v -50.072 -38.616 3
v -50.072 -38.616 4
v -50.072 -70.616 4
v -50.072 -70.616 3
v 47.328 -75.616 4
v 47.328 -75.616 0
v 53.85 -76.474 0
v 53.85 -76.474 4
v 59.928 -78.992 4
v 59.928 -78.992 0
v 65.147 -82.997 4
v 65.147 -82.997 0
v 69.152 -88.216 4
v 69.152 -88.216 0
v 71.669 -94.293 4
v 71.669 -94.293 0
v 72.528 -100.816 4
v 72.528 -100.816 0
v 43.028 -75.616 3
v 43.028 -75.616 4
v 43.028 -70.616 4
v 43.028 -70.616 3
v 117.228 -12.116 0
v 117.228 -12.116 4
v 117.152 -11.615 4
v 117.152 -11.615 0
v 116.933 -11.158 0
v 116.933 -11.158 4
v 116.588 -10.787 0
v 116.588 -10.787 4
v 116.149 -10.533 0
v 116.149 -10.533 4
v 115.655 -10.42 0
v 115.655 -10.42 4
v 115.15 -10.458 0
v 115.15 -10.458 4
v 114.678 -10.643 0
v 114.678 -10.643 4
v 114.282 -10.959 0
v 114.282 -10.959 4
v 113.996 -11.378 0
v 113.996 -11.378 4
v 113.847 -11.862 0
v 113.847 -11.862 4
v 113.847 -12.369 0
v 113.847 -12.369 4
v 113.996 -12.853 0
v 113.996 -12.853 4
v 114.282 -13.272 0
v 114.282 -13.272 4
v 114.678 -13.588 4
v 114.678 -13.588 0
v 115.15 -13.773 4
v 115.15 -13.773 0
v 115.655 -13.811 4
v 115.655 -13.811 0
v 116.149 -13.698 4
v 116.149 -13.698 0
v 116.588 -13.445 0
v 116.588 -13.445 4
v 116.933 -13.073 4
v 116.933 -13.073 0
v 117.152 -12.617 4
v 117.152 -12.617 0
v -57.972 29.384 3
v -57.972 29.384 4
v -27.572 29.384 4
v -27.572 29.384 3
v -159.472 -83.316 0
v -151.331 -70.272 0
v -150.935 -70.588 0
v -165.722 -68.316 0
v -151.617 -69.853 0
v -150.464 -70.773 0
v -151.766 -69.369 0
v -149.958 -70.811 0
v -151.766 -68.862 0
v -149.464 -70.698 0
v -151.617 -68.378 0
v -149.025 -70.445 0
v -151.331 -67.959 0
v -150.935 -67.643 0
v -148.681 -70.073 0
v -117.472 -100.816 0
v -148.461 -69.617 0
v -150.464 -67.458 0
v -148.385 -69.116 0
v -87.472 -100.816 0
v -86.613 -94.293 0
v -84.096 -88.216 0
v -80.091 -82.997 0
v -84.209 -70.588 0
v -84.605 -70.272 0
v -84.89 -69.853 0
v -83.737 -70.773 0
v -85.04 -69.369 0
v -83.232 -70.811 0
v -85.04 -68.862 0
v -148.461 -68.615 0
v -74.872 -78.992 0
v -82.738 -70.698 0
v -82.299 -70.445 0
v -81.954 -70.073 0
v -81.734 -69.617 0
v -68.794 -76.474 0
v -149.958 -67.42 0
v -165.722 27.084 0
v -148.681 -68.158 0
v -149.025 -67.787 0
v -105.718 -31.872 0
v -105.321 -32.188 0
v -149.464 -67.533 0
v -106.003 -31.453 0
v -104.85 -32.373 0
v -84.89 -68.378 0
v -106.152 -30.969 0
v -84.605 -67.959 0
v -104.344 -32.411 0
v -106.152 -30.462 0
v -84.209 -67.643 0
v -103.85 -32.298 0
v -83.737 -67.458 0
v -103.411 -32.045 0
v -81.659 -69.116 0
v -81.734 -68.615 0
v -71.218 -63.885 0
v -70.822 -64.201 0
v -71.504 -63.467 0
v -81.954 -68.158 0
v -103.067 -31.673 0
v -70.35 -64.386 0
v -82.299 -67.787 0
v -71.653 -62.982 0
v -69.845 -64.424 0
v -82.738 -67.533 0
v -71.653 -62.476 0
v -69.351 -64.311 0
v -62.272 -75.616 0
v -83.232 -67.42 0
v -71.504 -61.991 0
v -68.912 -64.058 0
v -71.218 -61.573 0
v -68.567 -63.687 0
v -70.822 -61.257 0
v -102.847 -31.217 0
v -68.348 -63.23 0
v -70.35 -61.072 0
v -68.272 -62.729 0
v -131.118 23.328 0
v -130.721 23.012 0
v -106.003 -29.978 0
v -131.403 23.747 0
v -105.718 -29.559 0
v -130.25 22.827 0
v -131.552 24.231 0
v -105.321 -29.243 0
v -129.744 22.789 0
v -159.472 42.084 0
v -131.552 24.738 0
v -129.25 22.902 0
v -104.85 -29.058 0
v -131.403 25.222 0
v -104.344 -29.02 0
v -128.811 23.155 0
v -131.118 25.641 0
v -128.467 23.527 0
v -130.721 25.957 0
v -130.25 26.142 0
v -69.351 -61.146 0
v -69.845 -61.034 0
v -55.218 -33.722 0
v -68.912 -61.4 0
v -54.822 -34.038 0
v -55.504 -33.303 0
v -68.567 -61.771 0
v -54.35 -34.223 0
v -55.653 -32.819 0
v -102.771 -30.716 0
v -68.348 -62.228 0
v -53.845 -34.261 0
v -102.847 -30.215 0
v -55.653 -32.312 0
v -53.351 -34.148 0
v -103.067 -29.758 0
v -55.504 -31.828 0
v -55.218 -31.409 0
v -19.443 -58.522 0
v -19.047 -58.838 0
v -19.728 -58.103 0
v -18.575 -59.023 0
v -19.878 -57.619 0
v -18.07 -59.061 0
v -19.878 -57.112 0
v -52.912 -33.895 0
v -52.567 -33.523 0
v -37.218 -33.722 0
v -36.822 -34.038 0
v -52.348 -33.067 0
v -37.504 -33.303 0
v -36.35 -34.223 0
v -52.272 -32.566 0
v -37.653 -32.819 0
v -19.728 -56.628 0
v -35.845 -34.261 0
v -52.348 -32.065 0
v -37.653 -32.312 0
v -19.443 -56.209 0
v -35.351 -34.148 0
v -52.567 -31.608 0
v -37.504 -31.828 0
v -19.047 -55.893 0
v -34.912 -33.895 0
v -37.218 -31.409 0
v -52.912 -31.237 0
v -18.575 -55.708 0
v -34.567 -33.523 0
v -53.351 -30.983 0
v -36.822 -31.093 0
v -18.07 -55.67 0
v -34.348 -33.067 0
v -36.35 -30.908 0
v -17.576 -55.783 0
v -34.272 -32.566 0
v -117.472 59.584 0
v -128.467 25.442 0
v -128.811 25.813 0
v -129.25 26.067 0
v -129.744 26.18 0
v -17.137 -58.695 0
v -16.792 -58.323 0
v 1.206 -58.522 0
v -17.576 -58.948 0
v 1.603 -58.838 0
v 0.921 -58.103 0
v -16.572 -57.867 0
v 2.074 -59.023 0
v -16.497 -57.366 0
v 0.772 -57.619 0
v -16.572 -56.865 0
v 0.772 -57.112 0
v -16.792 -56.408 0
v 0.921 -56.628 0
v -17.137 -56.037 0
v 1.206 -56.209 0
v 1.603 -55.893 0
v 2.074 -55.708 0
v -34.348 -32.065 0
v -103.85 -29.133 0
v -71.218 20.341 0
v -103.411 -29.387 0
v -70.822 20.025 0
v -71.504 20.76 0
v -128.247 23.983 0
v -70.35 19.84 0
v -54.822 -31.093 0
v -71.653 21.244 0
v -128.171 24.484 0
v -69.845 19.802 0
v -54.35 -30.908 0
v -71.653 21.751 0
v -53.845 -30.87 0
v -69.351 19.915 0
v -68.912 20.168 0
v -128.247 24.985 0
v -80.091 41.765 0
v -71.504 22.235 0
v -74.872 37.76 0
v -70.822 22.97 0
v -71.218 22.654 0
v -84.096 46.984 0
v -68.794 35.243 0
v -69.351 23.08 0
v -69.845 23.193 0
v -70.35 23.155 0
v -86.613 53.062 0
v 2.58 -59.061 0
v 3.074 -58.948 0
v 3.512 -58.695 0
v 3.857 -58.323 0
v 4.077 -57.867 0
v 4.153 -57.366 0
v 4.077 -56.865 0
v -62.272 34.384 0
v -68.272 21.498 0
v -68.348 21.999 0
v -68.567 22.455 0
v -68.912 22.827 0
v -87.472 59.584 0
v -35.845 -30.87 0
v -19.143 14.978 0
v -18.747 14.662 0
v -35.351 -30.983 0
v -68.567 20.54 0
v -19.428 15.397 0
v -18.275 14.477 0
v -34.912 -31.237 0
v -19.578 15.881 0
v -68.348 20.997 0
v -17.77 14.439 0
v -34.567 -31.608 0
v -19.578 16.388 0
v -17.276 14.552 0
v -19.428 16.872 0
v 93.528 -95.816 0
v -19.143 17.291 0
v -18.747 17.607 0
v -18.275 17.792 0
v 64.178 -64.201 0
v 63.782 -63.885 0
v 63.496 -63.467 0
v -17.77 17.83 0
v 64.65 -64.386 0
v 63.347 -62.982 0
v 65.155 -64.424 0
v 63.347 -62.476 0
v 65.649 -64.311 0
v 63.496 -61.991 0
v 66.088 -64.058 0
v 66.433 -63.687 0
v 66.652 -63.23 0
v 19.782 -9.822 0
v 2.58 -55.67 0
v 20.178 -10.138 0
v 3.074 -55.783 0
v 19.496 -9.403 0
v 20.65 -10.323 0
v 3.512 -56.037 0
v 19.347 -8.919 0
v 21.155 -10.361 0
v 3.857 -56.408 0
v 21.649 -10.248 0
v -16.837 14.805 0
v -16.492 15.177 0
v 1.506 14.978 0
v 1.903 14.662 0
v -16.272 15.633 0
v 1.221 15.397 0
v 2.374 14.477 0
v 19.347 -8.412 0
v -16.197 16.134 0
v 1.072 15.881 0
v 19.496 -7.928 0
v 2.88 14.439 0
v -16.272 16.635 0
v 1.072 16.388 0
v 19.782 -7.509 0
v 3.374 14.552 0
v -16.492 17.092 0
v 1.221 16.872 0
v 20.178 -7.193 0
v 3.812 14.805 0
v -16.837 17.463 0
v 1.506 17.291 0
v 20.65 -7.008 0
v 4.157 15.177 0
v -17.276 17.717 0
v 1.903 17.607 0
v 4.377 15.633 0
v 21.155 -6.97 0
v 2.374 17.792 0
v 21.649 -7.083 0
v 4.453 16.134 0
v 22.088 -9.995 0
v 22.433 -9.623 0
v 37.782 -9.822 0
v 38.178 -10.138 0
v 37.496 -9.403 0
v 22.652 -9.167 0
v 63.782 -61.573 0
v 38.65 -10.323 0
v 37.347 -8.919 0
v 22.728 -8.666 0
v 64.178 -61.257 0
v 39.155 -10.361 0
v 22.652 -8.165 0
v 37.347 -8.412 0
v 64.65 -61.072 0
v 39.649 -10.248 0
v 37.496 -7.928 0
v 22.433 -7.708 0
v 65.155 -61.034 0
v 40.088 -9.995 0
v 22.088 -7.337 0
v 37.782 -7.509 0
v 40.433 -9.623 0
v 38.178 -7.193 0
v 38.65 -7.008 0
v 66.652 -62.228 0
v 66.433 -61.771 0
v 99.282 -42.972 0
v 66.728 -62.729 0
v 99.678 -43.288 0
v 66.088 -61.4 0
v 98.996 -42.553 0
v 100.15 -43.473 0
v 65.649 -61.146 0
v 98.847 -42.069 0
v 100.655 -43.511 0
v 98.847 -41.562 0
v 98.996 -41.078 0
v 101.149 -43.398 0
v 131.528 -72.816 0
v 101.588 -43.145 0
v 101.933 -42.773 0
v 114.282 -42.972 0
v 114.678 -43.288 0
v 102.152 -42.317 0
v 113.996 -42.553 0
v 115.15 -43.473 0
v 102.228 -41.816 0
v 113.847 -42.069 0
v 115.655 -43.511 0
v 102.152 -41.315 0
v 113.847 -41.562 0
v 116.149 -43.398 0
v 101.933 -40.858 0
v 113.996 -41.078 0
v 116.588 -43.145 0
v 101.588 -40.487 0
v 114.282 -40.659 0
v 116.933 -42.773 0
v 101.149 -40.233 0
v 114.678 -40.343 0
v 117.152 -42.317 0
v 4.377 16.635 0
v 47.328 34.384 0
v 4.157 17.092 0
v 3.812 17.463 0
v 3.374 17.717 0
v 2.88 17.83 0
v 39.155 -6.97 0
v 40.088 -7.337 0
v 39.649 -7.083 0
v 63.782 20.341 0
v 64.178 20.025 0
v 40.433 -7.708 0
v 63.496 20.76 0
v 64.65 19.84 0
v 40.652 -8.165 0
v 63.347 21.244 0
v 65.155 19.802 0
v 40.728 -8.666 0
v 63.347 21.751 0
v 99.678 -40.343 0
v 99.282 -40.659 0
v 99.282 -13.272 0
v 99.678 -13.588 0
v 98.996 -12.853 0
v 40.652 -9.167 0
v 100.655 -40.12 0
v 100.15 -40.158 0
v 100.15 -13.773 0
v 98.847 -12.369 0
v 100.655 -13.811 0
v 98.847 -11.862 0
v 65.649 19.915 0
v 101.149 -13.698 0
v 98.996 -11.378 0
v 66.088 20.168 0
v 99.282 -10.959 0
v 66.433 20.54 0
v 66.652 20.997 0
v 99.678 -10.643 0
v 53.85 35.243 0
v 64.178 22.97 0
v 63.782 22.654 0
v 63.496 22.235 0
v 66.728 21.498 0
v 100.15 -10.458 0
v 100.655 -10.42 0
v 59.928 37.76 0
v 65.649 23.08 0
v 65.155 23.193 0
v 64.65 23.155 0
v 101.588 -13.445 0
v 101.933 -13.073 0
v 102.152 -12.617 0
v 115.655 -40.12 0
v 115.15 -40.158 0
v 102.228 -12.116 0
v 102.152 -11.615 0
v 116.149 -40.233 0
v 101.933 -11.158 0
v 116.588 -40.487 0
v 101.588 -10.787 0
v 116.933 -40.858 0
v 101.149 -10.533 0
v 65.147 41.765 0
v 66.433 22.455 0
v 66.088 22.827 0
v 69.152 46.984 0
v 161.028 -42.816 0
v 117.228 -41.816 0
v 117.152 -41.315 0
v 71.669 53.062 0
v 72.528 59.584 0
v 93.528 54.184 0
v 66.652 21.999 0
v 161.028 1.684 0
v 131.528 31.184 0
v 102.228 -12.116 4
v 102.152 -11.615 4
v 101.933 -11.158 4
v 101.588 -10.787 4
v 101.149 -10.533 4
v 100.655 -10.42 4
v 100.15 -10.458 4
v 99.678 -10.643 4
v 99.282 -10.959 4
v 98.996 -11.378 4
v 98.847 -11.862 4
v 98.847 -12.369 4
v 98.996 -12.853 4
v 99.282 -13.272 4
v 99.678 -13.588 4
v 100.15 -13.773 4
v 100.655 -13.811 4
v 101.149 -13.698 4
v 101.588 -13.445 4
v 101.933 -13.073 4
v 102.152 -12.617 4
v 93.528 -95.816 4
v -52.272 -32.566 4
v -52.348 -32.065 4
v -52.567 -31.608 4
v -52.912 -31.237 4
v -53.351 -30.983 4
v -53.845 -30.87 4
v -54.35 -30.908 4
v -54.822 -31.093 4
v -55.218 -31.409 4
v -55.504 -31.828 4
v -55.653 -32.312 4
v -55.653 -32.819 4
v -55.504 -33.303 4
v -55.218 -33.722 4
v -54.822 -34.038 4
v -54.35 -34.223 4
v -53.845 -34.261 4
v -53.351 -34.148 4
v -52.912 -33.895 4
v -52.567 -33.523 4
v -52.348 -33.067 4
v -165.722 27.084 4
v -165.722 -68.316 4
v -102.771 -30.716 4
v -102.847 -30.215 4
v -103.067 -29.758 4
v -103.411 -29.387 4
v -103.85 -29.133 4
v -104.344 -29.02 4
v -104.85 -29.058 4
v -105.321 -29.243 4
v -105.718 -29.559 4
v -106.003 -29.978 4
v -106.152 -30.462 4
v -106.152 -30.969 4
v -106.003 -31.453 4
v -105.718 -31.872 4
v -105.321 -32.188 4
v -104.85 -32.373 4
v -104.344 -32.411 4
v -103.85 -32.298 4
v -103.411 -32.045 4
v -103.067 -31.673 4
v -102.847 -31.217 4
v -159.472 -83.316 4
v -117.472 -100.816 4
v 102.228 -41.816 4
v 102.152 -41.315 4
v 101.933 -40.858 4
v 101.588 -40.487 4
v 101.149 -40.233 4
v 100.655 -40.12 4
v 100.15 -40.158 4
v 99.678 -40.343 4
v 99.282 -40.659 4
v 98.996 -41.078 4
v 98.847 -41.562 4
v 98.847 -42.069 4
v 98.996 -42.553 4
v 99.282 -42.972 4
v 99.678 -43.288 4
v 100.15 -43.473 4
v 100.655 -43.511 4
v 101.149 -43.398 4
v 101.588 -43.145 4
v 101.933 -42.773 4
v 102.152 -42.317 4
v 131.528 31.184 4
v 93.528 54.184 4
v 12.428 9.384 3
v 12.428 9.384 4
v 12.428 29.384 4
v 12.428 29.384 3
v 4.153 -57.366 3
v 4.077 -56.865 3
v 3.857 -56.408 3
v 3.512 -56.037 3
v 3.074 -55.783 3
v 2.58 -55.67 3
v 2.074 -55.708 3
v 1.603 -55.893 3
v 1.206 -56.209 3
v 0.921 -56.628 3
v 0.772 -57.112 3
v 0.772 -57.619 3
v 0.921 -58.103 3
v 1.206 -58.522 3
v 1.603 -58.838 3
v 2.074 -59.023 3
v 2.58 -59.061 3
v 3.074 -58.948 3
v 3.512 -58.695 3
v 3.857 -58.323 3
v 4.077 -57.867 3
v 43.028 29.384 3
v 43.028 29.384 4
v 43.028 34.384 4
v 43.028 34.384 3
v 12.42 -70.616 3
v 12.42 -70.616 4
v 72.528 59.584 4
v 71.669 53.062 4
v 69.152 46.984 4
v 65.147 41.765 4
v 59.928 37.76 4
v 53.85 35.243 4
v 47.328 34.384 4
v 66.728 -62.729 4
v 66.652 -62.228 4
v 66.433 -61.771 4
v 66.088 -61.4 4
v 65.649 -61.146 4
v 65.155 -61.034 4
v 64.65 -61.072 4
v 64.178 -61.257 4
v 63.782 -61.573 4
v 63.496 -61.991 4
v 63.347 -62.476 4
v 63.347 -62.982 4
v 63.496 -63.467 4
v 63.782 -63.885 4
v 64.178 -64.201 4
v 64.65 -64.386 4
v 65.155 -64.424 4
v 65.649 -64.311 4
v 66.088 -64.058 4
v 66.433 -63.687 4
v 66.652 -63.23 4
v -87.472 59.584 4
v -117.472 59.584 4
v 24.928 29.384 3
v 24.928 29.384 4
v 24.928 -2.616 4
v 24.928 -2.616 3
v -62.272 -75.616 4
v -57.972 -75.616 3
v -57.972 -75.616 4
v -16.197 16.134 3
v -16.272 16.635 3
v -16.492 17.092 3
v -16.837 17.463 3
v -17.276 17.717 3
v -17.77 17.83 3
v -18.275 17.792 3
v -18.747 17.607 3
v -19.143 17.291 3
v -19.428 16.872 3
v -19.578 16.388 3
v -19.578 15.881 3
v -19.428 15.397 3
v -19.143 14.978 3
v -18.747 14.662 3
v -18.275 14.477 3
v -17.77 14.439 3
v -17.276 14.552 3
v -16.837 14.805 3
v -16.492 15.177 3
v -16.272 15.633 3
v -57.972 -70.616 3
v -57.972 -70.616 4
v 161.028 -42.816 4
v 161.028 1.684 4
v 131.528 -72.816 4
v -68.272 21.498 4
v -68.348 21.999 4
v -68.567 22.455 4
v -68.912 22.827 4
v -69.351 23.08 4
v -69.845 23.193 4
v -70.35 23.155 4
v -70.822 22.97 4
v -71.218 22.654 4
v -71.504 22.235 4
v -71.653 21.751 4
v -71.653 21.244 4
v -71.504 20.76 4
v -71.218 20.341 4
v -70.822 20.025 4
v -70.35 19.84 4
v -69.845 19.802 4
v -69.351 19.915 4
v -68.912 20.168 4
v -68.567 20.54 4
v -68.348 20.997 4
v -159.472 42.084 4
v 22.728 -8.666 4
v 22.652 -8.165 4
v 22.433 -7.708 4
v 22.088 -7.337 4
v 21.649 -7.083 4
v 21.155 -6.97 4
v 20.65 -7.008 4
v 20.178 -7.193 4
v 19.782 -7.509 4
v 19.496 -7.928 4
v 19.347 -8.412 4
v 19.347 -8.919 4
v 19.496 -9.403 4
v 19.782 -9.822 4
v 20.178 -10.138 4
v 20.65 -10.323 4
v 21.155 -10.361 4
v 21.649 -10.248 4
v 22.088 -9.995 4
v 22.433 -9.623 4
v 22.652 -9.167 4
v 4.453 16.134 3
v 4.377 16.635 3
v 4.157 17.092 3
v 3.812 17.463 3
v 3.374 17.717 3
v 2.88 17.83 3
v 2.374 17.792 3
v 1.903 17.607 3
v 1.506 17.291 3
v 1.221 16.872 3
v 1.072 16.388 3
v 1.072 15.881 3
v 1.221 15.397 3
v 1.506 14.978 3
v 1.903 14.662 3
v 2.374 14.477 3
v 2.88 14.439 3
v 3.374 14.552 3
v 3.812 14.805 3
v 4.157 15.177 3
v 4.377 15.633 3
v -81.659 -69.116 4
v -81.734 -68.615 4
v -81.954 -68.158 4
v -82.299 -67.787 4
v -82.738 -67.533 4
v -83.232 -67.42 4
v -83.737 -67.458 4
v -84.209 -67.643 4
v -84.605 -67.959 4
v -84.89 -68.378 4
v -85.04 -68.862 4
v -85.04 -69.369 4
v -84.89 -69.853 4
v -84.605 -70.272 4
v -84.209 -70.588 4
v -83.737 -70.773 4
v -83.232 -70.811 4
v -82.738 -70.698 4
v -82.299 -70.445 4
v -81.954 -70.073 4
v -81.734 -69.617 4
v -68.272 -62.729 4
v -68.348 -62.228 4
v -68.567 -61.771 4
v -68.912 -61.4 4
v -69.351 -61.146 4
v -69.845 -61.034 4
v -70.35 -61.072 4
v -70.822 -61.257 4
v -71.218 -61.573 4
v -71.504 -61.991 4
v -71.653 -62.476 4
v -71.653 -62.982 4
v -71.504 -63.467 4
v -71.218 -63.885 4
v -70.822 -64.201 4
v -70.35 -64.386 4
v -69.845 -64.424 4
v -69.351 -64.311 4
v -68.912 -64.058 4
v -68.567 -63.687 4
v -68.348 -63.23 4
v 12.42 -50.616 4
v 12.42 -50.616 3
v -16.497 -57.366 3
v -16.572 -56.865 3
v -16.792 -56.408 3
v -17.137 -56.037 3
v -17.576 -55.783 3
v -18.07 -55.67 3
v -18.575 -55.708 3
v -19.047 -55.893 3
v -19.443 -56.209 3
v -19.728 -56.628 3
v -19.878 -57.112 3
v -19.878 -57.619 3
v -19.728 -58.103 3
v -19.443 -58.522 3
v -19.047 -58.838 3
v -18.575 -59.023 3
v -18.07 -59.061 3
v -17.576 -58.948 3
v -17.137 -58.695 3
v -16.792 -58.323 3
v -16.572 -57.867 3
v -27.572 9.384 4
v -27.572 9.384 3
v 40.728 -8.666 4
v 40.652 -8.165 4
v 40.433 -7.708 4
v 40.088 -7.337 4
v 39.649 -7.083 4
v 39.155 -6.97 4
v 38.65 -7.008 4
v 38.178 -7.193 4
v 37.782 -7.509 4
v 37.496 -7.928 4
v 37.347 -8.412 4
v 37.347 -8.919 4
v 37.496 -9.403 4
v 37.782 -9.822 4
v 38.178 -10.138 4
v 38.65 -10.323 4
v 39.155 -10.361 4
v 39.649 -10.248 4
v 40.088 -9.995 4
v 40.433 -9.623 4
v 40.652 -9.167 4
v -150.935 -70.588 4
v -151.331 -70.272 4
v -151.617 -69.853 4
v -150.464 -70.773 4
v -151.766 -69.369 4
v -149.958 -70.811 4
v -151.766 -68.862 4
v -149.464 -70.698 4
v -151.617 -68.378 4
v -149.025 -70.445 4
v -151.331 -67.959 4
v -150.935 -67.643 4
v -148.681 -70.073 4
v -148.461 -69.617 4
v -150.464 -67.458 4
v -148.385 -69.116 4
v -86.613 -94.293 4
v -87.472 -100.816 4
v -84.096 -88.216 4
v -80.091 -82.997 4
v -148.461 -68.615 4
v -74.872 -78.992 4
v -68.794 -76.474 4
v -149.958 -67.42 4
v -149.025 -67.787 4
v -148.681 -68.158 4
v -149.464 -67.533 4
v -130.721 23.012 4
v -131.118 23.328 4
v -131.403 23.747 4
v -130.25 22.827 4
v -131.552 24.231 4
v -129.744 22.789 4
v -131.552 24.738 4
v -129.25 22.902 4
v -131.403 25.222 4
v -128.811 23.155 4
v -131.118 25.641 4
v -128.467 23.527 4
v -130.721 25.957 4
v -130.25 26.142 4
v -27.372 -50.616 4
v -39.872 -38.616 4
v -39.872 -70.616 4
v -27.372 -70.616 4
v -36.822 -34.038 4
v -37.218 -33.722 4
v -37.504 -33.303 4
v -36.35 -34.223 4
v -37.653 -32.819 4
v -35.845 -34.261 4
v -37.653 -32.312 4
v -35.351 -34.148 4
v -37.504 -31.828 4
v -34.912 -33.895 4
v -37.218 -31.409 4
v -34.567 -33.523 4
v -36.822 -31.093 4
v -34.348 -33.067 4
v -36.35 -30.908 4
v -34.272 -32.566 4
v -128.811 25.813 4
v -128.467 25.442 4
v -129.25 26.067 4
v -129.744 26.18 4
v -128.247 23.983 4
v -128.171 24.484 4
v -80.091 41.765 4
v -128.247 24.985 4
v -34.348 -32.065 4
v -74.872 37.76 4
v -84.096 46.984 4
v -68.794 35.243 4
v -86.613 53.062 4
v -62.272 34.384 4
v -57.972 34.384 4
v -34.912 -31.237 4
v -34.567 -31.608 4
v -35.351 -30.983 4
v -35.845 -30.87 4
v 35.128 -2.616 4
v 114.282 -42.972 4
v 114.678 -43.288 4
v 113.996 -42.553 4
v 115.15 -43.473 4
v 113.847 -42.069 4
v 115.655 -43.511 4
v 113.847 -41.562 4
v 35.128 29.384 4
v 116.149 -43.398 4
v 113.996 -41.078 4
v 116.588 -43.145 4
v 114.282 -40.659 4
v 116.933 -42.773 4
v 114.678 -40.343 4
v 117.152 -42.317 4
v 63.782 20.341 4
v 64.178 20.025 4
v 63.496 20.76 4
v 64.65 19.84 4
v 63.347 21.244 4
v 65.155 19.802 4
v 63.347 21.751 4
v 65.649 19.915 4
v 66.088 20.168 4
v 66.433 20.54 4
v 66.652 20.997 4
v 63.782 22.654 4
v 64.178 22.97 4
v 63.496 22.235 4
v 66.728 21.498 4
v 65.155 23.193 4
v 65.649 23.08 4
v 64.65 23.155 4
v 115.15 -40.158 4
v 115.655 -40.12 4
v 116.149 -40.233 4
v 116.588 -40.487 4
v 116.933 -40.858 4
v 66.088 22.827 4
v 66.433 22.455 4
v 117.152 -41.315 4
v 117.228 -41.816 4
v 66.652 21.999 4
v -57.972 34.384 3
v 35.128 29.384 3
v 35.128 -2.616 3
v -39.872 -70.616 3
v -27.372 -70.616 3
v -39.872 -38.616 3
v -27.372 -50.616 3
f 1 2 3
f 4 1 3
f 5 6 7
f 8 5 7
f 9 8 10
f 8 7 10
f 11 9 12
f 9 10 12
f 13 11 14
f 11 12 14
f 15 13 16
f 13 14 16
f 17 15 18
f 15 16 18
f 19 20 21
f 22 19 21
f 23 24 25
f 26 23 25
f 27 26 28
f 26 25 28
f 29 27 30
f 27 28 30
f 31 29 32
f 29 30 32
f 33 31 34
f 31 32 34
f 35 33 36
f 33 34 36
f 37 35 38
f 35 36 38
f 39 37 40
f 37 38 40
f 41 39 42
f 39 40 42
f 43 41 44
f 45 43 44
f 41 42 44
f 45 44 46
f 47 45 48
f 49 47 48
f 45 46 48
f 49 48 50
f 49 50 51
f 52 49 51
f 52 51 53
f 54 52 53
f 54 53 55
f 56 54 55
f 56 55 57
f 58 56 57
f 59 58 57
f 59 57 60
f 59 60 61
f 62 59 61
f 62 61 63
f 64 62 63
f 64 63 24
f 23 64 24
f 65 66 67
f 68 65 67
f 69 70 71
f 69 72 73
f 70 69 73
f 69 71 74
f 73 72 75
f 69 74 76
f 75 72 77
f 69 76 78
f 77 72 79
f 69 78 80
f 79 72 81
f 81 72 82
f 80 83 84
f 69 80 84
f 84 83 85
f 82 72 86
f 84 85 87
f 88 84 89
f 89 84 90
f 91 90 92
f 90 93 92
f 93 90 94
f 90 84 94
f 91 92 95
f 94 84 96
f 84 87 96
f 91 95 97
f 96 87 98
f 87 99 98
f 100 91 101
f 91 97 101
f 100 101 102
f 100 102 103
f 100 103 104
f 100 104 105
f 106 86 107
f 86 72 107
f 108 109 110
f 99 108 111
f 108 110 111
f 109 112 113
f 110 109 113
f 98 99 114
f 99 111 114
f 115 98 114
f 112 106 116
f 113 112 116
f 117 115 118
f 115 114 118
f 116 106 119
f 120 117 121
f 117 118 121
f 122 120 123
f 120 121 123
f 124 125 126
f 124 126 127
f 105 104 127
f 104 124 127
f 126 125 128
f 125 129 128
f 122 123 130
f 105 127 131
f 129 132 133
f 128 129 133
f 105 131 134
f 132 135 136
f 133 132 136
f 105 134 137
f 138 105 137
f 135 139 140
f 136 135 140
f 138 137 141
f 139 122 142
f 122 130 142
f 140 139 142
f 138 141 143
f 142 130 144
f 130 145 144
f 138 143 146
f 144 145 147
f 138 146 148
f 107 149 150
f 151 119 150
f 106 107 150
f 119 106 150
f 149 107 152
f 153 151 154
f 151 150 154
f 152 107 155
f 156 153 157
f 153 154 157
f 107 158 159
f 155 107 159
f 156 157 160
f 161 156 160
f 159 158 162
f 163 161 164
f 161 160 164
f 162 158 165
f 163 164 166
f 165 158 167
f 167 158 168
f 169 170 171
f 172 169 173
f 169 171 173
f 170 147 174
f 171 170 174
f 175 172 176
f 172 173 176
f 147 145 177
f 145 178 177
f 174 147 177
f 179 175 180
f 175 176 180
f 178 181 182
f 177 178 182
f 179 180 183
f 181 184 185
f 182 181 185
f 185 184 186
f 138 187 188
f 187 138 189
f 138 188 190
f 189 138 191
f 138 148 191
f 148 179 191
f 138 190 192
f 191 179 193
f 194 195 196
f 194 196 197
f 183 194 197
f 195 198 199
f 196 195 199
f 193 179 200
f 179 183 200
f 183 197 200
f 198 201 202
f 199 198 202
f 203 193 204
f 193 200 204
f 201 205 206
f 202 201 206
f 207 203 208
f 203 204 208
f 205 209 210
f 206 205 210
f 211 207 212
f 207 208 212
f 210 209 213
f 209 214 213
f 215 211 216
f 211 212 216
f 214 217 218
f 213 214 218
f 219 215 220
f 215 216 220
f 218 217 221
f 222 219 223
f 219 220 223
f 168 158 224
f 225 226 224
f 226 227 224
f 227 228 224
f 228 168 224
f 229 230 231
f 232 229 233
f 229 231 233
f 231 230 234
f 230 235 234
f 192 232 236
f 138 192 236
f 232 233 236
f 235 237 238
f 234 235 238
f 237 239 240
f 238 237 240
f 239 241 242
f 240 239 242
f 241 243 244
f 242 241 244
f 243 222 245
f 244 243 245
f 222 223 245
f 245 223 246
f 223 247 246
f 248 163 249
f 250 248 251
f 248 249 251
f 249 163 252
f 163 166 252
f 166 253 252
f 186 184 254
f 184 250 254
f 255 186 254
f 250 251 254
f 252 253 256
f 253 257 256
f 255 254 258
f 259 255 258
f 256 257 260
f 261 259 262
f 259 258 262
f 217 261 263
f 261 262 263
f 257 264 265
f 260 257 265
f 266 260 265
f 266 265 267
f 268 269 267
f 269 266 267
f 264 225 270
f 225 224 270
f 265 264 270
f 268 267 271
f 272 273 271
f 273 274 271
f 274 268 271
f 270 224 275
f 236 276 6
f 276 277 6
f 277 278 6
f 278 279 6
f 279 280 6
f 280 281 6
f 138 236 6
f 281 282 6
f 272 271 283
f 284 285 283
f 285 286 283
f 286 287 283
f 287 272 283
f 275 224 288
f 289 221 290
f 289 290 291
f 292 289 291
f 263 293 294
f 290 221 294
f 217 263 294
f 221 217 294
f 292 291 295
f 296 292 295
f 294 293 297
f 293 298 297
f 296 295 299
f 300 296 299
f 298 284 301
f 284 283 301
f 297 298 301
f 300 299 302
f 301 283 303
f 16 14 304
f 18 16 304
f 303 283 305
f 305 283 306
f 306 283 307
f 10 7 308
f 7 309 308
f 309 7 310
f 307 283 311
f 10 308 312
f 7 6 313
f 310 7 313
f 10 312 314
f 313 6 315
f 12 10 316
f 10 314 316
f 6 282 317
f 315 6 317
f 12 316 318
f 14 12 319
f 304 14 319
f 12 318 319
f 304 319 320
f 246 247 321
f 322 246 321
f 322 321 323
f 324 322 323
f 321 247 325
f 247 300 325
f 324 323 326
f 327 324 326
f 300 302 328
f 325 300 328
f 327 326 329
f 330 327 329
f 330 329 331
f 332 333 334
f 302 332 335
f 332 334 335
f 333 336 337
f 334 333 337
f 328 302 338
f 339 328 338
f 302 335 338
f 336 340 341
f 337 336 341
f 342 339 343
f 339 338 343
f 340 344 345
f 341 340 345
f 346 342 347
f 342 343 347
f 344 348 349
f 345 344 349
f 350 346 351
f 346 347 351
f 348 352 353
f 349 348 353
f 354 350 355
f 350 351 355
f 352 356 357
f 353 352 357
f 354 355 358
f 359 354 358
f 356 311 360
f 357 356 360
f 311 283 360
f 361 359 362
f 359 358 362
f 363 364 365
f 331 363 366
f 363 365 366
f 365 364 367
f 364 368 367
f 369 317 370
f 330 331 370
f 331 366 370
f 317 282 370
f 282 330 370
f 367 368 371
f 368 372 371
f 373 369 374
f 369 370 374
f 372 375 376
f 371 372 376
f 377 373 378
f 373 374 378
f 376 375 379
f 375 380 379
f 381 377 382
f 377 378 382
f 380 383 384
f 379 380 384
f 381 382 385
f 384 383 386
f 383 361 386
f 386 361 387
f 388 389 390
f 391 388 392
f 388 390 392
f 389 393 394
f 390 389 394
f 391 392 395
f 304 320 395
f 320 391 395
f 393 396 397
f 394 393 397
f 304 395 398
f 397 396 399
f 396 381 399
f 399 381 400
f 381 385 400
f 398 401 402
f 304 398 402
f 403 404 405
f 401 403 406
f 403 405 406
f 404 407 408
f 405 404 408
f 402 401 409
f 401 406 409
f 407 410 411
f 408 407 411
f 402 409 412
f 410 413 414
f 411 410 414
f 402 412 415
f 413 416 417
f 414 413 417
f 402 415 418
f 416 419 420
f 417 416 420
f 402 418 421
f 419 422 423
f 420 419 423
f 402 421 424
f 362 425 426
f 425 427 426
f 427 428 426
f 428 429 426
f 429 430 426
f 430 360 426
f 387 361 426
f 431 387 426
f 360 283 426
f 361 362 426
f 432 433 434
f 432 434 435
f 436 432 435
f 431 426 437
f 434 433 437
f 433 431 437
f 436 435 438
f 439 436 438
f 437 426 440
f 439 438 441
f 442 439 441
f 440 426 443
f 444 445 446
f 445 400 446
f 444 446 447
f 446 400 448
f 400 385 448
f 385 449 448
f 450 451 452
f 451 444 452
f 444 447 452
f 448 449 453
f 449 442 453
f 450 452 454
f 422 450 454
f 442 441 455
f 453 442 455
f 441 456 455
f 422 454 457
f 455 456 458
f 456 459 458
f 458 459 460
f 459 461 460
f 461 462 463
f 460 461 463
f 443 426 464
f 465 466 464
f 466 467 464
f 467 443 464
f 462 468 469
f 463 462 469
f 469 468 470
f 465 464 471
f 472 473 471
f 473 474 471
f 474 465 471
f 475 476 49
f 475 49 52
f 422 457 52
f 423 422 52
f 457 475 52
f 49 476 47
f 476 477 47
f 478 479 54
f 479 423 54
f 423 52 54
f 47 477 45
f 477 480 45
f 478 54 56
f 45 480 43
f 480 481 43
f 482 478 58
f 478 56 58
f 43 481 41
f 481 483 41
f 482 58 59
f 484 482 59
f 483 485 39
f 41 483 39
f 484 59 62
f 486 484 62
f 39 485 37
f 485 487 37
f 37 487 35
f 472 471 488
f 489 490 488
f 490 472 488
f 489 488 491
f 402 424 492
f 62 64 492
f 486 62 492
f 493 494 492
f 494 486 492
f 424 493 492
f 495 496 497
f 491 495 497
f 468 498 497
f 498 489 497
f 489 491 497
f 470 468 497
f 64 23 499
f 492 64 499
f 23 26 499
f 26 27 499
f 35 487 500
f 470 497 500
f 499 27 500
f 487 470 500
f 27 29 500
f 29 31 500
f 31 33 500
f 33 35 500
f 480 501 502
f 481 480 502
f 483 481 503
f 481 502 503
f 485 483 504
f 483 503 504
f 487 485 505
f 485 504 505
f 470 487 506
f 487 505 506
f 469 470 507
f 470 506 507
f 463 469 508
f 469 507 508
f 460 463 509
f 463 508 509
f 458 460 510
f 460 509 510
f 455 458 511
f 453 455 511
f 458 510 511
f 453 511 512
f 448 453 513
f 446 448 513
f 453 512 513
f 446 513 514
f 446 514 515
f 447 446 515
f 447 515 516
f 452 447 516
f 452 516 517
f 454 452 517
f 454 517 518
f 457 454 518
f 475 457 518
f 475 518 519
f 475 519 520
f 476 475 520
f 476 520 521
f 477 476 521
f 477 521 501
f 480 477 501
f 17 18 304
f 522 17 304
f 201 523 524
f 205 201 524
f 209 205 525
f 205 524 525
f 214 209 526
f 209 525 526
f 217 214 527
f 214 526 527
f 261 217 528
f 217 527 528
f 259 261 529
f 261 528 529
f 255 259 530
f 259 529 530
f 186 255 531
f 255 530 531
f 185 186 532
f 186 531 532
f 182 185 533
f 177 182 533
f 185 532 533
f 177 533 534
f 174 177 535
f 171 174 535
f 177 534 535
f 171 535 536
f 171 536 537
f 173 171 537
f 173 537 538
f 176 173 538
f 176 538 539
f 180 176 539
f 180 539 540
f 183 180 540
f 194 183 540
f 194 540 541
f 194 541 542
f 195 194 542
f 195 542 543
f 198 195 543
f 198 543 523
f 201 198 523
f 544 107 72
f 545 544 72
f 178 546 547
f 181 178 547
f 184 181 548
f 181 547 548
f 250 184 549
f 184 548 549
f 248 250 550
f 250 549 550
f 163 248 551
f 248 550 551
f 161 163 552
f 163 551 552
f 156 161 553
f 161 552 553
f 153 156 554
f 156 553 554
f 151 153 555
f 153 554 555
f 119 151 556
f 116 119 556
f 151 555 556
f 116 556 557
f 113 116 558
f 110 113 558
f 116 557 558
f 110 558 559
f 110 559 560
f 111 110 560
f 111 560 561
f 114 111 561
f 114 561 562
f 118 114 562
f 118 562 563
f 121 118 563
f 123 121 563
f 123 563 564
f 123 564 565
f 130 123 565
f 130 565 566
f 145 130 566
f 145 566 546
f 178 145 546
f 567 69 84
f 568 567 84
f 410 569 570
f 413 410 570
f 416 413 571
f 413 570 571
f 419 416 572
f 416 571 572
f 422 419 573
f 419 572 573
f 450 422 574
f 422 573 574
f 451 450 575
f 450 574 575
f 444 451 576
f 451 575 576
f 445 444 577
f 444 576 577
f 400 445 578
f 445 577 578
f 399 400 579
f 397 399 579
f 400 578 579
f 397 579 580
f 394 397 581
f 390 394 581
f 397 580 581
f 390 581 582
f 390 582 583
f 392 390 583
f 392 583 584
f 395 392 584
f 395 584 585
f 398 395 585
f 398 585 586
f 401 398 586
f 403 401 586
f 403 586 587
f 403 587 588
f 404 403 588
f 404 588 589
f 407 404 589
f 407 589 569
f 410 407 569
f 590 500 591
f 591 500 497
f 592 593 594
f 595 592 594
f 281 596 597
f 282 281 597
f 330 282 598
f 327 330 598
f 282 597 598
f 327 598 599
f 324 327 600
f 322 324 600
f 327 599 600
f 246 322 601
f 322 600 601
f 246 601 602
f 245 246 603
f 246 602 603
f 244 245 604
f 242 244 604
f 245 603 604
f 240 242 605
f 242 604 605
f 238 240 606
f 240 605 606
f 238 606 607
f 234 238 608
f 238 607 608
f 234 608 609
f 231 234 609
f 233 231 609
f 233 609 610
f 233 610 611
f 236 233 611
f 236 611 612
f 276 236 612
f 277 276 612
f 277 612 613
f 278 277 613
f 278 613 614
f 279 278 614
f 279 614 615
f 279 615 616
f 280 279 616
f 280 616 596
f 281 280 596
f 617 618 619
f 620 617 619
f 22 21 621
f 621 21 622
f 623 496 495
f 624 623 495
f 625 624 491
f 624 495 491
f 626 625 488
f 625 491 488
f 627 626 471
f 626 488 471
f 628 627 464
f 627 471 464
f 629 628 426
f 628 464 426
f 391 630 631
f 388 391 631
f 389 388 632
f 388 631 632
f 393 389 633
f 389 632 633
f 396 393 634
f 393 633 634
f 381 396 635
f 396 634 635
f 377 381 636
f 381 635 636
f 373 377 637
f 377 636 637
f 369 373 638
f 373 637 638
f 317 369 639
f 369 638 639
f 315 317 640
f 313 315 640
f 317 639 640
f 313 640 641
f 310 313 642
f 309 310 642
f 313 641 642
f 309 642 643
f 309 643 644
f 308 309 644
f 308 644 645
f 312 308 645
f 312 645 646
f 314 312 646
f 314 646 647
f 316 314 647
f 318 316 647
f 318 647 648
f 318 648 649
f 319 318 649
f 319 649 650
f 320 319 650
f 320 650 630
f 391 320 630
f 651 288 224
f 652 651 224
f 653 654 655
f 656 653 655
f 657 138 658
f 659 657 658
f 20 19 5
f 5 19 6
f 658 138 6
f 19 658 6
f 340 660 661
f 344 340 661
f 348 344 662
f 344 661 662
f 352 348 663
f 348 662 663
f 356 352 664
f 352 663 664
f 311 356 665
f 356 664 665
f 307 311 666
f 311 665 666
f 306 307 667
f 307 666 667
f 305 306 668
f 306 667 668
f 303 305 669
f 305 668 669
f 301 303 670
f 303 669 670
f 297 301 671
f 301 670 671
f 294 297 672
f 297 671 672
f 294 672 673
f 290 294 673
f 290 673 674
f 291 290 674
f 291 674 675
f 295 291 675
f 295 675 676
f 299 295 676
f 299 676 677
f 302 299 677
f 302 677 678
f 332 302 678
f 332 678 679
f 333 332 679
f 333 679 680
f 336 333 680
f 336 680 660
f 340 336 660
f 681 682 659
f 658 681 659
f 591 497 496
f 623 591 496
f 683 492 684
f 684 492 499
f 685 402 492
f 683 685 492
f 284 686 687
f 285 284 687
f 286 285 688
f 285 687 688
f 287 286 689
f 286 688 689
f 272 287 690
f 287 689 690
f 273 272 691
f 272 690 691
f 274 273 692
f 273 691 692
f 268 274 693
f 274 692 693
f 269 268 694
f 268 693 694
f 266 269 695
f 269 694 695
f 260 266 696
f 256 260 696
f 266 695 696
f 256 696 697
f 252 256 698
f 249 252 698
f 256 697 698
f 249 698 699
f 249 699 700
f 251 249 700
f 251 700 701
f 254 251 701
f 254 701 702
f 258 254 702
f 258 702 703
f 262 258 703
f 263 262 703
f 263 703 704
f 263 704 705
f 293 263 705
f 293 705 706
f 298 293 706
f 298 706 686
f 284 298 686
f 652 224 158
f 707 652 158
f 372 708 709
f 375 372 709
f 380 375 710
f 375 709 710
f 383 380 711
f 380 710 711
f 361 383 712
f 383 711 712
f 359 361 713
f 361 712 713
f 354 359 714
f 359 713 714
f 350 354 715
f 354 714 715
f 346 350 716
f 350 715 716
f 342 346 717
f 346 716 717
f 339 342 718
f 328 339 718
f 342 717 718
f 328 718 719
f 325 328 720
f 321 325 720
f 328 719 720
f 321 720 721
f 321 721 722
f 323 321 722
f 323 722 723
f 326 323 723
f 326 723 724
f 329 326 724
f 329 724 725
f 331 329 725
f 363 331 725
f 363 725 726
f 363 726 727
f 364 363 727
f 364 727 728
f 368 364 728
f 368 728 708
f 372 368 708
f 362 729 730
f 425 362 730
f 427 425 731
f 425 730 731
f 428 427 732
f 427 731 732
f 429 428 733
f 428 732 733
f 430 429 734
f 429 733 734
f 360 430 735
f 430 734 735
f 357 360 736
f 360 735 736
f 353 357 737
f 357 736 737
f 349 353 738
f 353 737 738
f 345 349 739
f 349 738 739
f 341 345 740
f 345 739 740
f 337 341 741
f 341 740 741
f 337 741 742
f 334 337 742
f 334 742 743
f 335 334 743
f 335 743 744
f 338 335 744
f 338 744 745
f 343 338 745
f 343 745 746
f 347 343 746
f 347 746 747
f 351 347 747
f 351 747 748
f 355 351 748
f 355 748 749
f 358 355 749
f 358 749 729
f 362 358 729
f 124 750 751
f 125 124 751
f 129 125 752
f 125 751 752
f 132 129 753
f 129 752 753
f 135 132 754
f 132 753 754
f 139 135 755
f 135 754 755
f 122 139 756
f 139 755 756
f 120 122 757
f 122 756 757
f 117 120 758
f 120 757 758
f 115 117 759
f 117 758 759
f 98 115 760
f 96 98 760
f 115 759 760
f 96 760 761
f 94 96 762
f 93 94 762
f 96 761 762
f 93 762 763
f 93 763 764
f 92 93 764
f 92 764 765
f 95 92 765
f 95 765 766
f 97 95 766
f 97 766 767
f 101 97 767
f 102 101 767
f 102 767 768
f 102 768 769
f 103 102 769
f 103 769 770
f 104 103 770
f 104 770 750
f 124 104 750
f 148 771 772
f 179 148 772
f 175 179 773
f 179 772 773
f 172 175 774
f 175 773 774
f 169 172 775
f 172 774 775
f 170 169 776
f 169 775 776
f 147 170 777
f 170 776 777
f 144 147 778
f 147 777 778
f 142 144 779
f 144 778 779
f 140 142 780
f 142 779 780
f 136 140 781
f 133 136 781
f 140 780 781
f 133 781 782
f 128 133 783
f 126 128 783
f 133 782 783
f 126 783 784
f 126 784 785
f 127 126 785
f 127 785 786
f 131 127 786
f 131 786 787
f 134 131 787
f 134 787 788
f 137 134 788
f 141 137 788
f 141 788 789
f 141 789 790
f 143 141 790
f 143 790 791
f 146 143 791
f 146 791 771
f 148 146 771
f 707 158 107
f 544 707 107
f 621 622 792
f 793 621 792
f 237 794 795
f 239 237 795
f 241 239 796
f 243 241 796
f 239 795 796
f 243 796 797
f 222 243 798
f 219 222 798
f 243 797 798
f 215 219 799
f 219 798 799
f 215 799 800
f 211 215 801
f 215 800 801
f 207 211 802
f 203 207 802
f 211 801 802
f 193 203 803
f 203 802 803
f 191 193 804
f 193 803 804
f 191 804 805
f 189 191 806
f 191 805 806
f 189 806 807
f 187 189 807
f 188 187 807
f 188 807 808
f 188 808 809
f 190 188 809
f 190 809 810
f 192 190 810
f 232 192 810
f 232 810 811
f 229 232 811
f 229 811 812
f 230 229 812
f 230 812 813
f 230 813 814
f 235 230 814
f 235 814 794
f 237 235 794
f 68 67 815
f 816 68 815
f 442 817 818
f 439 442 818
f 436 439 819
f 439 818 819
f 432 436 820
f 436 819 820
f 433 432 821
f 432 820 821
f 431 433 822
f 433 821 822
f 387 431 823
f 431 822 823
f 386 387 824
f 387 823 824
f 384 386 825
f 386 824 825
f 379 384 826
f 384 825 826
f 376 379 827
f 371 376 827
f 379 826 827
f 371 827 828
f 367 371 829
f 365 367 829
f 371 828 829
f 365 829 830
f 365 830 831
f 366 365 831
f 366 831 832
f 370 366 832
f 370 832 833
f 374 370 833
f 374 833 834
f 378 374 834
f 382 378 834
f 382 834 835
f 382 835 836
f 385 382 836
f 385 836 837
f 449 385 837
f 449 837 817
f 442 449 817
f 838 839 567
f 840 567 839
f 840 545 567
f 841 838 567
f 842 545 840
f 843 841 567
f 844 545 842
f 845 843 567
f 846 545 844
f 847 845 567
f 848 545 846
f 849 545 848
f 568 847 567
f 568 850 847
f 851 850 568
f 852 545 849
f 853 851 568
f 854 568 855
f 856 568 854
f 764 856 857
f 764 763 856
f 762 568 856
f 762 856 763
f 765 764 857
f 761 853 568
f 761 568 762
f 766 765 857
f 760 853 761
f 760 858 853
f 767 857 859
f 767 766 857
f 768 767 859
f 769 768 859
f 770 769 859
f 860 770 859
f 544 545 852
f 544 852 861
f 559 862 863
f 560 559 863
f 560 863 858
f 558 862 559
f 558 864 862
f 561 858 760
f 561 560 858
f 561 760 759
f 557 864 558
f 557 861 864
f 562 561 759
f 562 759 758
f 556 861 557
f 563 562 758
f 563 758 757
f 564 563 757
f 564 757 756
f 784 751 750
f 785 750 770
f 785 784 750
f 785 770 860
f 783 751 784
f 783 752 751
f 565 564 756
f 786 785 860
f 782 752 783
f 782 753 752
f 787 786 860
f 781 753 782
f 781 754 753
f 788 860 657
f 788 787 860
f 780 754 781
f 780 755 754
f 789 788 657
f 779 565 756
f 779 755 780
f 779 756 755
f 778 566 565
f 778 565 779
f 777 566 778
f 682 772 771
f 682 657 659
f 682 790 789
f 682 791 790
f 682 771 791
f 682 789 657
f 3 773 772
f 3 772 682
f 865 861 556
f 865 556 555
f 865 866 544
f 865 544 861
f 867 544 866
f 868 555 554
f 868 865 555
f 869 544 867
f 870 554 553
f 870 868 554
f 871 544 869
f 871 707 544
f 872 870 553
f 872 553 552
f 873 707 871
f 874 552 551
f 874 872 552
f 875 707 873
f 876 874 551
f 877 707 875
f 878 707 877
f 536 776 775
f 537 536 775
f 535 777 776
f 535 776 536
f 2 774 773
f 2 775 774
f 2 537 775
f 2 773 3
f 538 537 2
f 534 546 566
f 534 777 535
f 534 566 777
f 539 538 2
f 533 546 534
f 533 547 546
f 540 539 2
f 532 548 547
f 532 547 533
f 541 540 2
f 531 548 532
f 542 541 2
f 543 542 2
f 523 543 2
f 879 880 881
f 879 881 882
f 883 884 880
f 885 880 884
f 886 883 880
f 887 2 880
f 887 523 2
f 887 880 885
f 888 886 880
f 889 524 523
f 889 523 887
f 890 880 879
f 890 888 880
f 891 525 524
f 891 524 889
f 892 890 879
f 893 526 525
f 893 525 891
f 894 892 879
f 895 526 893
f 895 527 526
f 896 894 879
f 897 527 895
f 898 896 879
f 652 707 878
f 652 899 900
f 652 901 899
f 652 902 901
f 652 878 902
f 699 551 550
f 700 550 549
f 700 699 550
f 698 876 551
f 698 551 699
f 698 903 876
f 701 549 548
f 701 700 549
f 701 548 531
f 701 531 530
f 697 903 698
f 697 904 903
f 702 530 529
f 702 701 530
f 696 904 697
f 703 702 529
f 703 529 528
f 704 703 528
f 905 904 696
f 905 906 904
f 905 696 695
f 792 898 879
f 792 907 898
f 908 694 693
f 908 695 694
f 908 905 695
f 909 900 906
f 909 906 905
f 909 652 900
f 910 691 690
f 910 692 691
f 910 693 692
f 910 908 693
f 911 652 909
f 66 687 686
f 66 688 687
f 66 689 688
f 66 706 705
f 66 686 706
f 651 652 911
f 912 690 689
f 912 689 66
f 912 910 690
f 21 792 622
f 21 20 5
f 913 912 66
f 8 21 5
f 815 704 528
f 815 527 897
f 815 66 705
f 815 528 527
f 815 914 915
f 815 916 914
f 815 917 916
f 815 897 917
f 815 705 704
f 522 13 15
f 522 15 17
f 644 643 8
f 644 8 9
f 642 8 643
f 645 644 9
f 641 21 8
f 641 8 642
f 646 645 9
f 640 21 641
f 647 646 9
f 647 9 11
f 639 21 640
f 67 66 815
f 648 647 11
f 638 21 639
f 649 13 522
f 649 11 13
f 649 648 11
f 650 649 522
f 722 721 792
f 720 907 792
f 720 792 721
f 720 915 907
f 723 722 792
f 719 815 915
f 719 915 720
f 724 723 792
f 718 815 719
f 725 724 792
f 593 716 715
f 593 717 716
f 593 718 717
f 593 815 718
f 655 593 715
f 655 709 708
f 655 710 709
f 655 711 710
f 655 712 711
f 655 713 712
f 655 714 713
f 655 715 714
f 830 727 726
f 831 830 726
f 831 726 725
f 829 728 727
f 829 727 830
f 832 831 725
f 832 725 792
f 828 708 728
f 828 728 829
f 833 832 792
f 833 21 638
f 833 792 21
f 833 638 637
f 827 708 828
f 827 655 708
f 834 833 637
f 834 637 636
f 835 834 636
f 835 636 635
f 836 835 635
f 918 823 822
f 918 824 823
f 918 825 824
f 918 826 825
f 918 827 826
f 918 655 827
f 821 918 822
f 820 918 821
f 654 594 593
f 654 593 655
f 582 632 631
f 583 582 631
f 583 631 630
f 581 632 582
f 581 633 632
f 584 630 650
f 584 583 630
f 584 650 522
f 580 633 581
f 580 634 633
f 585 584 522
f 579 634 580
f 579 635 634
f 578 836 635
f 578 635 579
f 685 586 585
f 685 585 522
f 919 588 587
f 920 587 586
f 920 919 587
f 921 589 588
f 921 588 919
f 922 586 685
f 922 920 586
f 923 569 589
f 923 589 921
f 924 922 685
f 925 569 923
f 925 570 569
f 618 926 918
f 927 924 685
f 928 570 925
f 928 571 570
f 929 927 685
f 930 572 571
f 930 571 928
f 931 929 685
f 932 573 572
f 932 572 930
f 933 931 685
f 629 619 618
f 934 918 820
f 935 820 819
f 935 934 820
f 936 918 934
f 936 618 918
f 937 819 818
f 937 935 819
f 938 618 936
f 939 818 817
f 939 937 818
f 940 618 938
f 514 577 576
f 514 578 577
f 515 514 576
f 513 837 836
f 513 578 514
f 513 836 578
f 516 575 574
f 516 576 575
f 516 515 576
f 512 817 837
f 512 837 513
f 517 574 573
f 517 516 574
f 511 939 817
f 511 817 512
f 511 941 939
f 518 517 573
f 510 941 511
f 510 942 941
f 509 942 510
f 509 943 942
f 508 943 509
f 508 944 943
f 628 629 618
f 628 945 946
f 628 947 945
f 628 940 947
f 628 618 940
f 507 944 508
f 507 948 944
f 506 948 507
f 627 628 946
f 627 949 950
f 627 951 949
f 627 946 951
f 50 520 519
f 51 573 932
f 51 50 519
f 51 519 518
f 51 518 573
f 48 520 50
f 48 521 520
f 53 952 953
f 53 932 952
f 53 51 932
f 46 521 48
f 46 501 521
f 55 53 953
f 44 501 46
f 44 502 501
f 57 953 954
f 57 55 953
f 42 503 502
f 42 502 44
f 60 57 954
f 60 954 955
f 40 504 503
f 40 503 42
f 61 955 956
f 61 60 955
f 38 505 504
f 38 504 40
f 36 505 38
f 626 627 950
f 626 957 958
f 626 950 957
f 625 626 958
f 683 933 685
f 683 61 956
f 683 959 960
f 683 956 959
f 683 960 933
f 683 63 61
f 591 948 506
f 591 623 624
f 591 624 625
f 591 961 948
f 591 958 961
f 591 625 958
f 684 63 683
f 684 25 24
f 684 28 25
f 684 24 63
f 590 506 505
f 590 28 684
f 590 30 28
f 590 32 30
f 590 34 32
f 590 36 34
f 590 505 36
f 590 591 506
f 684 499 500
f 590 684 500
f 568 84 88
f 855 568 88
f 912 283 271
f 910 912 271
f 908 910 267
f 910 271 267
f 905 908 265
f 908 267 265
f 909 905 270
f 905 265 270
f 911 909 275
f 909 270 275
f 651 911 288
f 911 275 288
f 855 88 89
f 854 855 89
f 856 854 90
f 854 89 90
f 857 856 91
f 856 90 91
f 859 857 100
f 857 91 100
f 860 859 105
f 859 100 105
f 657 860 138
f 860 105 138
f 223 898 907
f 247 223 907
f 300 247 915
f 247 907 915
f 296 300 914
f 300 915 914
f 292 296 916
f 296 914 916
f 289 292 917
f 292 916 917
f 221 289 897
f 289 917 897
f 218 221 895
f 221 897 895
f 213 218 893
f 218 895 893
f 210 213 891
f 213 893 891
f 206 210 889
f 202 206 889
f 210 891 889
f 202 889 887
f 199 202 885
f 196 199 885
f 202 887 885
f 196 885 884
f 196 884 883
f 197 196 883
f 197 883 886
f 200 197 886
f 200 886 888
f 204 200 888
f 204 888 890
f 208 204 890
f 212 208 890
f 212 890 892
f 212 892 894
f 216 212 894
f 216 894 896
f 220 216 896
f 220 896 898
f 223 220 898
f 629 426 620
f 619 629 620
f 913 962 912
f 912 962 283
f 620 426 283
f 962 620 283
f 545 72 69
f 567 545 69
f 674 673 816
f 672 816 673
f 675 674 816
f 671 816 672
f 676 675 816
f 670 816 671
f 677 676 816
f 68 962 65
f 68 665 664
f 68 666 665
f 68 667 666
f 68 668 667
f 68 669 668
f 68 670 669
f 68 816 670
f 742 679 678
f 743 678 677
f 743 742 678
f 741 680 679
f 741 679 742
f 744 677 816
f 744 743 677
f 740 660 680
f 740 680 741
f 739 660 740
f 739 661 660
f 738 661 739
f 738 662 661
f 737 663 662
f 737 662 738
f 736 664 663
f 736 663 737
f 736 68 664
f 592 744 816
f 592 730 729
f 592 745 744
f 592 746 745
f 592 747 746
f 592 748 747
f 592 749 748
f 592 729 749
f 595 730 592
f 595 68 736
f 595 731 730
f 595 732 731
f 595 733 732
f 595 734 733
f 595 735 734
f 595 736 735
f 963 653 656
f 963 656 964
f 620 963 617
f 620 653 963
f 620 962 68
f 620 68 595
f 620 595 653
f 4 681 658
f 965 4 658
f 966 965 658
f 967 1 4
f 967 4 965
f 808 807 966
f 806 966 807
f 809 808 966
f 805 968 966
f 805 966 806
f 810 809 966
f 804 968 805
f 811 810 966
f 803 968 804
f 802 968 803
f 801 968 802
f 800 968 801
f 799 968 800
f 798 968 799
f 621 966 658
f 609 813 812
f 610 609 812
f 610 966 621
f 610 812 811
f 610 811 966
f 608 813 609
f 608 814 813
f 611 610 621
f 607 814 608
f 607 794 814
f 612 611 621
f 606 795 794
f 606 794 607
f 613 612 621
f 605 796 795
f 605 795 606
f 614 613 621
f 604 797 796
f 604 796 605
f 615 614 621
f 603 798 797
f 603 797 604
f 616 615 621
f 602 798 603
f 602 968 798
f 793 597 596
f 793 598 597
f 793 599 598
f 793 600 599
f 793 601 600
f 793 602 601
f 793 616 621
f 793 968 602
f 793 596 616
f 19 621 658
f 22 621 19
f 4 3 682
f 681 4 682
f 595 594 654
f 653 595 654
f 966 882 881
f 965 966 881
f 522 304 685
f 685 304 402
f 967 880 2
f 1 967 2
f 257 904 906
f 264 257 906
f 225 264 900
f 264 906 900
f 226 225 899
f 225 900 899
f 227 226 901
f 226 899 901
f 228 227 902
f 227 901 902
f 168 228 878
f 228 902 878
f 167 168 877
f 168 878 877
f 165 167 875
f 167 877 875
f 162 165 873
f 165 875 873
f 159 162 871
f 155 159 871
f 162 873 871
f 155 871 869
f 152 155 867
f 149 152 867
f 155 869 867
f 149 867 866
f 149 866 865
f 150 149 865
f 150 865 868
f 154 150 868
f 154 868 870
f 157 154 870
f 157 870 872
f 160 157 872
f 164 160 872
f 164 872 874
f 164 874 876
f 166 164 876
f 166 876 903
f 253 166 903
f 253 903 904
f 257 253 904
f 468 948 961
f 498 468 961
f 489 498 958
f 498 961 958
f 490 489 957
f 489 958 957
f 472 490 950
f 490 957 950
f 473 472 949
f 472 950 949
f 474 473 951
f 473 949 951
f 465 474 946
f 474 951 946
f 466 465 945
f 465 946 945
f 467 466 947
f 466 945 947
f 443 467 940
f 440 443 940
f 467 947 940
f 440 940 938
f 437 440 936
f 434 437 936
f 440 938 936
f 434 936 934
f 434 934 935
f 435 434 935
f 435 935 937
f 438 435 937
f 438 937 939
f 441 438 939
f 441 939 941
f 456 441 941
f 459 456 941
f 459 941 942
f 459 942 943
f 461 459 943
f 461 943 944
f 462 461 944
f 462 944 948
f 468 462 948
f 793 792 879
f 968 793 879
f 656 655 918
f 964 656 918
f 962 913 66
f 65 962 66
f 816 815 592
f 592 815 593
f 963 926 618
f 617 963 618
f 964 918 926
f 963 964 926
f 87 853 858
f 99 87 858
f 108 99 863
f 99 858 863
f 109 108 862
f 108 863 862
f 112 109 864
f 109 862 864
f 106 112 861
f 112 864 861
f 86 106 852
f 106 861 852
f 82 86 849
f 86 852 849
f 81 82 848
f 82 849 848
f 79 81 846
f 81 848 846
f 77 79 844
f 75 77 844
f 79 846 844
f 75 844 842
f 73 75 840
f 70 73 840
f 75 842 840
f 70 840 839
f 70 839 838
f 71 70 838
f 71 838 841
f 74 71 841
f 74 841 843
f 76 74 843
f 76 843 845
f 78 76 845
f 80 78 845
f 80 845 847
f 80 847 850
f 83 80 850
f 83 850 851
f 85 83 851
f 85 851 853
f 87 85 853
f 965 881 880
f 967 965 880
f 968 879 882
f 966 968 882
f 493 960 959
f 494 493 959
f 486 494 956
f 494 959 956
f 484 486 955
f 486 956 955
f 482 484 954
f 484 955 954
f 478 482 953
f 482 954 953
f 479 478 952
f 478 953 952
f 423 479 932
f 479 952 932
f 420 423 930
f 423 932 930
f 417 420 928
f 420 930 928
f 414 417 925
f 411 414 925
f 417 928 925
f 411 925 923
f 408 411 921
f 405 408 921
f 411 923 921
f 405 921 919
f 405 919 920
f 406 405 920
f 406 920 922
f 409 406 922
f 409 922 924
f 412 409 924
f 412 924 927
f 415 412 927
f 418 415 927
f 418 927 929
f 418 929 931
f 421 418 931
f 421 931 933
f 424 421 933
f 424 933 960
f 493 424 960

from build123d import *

# Parameters (mm, degrees)
BOSS_EXTRU_1_DEPTH      = 4
D_GAGEMENT_M2_51_D      = 2.9
D_GAGEMENT_M2_51_DEPTH  = 5
D_GAGEMENT_M2_51_TIP    = 0.871247898
D_GAGEMENT_M31_D        = 3.4
D_GAGEMENT_M31_DEPTH    = 6
D_GAGEMENT_M31_TIP      = 1.021463052
D_GAGEMENT_M32_D        = 3.4
D_GAGEMENT_M32_DEPTH    = 5
D_GAGEMENT_M32_TIP      = 1.021463052
ENL_V_MAT_EXTRU_1_DEPTH = 1
ENL_V_MAT_EXTRU_2_DEPTH = 1
D_GAGEMENT_M33_D        = 3.4
D_GAGEMENT_M33_DEPTH    = 6
D_GAGEMENT_M33_TIP      = 1.021463052
D_GAGEMENT_M34_D        = 3.4
D_GAGEMENT_M34_DEPTH    = 5
D_GAGEMENT_M34_TIP      = 1.021463052
D_GAGEMENT_M35_D        = 3.4
D_GAGEMENT_M35_DEPTH    = 5
D_GAGEMENT_M35_TIP      = 1.021463052


with BuildPart() as part:
    # Esquisse1 → Boss.-Extru.1 (new body)
    with BuildSketch(Plane.XY):
        with BuildLine():
            Line((-87.472008168, 59.584338106), (-117.472008168, 59.584338106))
            Line((-117.472008168, 59.584338106), (-159.472008168, 42.084338106))
            Line((-159.472008168, 42.084338106), (-165.722008168, 27.084338106))
            Line((-165.722008168, 27.084338106), (-165.722008168, -68.315661894))
            Line((-165.722008168, -68.315661894), (-159.472008168, -83.315661894))
            Line((-159.472008168, -83.315661894), (-117.472008168, -100.815661894))
            Line((-117.472008168, -100.815661894), (-87.472008168, -100.815661894))
            ThreePointArc((-87.472008168, -100.815661894), (-80.091099054, -82.996571008), (-62.272008168, -75.615661894))
            Line((-62.272008168, -75.615661894), (47.327991832, -75.615661894))
            ThreePointArc((47.327991832, -75.615661894), (65.147082718, -82.996571008), (72.527991832, -100.815661894))
            Line((72.527991832, -100.815661894), (93.527991832, -95.815661894))
            Line((93.527991832, -95.815661894), (131.527991832, -72.815661894))
            Line((131.527991832, -72.815661894), (161.027991832, -42.815661894))
            Line((161.027991832, -42.815661894), (161.027991832, 1.684338106))
            Line((161.027991832, 1.684338106), (131.527991832, 31.184338106))
            Line((131.527991832, 31.184338106), (93.527991832, 54.184338106))
            Line((93.527991832, 54.184338106), (72.527991832, 59.584338106))
            ThreePointArc((72.527991832, 59.584338106), (65.147082718, 41.76524722), (47.327991832, 34.384338106))
            Line((47.327991832, 34.384338106), (-62.272008168, 34.384338106))
            ThreePointArc((-62.272008168, 34.384338106), (-80.091099054, 41.76524722), (-87.472008168, 59.584338106))
        make_face()
    extrude(amount=BOSS_EXTRU_1_DEPTH)

    # Dégagement M2.51
    with Locations(Plane(origin=(0, 0, 0), x_dir=(-1, 0, 0), z_dir=(0, 0, -1))):
        with Locations((-21.027991832, -8.66564946), (-39.027991832, -8.66564946), (35.972008168, -32.565674331), (53.972008168, -32.565674331)):
            Hole(D_GAGEMENT_M2_51_D / 2, depth=D_GAGEMENT_M2_51_DEPTH)
            with Locations((0, 0, -(D_GAGEMENT_M2_51_DEPTH + D_GAGEMENT_M2_51_TIP / 2))):  # 118° drill point
                Cone(0, D_GAGEMENT_M2_51_D / 2, D_GAGEMENT_M2_51_TIP, mode=Mode.SUBTRACT)

    # Dégagement M31
    with Locations(Plane(origin=(0, 0, 0), x_dir=(-1, 0, 0), z_dir=(0, 0, -1))):
        with Locations((17.896581687, 16.134338106), (-2.752565352, 16.134338106), (53.972008168, -32.565674331), (35.972008168, -32.565674331), (18.196581687, -57.365661894), (-2.452565352, -57.365661894), (-39.027991832, -8.66564946), (-21.027991832, -8.66564946)):
            Hole(D_GAGEMENT_M31_D / 2, depth=D_GAGEMENT_M31_DEPTH)
            with Locations((0, 0, -(D_GAGEMENT_M31_DEPTH + D_GAGEMENT_M31_TIP / 2))):  # 118° drill point
                Cone(0, D_GAGEMENT_M31_D / 2, D_GAGEMENT_M31_TIP, mode=Mode.SUBTRACT)

    # Dégagement M32
    with Locations(Plane(origin=(0, 0, 0), x_dir=(-1, 0, 0), z_dir=(0, 0, -1))):
        with Locations((69.972008168, -62.728910548), (69.972008168, 21.49758676), (-65.027991832, -62.728910548), (-65.027991832, 21.49758676)):
            Hole(D_GAGEMENT_M32_D / 2, depth=D_GAGEMENT_M32_DEPTH)
            with Locations((0, 0, -(D_GAGEMENT_M32_DEPTH + D_GAGEMENT_M32_TIP / 2))):  # 118° drill point
                Cone(0, D_GAGEMENT_M32_D / 2, D_GAGEMENT_M32_TIP, mode=Mode.SUBTRACT)

    # Esquisse10 → Enlèv. mat.-Extru.1 (cut)
    with BuildSketch(Plane.XY.offset(4)):
        Polygon((43.027991832, -75.615661894), (43.027991832, -70.615661894), (12.42027445, -70.615661894), (12.42027445, -50.615661894), (-27.372008168, -50.615661894), (-27.372008168, -70.615661894), (-36.072008168, -70.615661894), (-39.872008168, -70.615661894), (-39.872008168, -38.615661894), (-50.072008168, -38.615661894), (-50.072008168, -70.615661894), (-57.972008168, -70.615661894), (-57.972008168, -75.615661894), align=None)
    extrude(amount=-ENL_V_MAT_EXTRU_1_DEPTH, mode=Mode.SUBTRACT)

    # Esquisse10<3> → Enlèv. mat.-Extru.2 (cut)
    with BuildSketch(Plane.XY.offset(4)):
        Polygon((43.027991832, 29.384338106), (43.027991832, 34.384338106), (-57.972008168, 34.384338106), (-57.972008168, 29.384338106), (-27.572008168, 29.384338106), (-27.572008168, 9.384338106), (12.427991832, 9.384338106), (12.427991832, 29.384338106), (24.927991832, 29.384338106), (24.927991832, -2.615661894), (35.127991832, -2.615661894), (35.127991832, 29.384338106), align=None)
    extrude(amount=-ENL_V_MAT_EXTRU_2_DEPTH, mode=Mode.SUBTRACT)

    # Dégagement M33
    with Locations(Plane(origin=(0, 0, 0), x_dir=(-1, 0, 0), z_dir=(0, 0, -1))):
        with Locations((104.471408589, -30.715661894), (129.871408589, 24.484338106)):
            Hole(D_GAGEMENT_M33_D / 2, depth=D_GAGEMENT_M33_DEPTH)
            with Locations((0, 0, -(D_GAGEMENT_M33_DEPTH + D_GAGEMENT_M33_TIP / 2))):  # 118° drill point
                Cone(0, D_GAGEMENT_M33_D / 2, D_GAGEMENT_M33_TIP, mode=Mode.SUBTRACT)

    # Dégagement M34
    with Locations(Plane(origin=(0, 0, 0), x_dir=(-1, 0, 0), z_dir=(0, 0, -1))):
        with Locations((-100.527991832, -41.815661894), (-115.527991832, -41.815661894), (-100.527991832, -12.115661894), (-115.527991832, -12.115661894)):
            Hole(D_GAGEMENT_M34_D / 2, depth=D_GAGEMENT_M34_DEPTH)
            with Locations((0, 0, -(D_GAGEMENT_M34_DEPTH + D_GAGEMENT_M34_TIP / 2))):  # 118° drill point
                Cone(0, D_GAGEMENT_M34_D / 2, D_GAGEMENT_M34_TIP, mode=Mode.SUBTRACT)

    # Dégagement M35
    with Locations(Plane(origin=(0, 0, 0), x_dir=(-1, 0, 0), z_dir=(0, 0, -1))):
        with Locations((150.085256822, -69.115661894), (83.358759514, -69.115661894)):
            Hole(D_GAGEMENT_M35_D / 2, depth=D_GAGEMENT_M35_DEPTH)
            with Locations((0, 0, -(D_GAGEMENT_M35_DEPTH + D_GAGEMENT_M35_TIP / 2))):  # 118° drill point
                Cone(0, D_GAGEMENT_M35_D / 2, D_GAGEMENT_M35_TIP, mode=Mode.SUBTRACT)


solid = part.part
